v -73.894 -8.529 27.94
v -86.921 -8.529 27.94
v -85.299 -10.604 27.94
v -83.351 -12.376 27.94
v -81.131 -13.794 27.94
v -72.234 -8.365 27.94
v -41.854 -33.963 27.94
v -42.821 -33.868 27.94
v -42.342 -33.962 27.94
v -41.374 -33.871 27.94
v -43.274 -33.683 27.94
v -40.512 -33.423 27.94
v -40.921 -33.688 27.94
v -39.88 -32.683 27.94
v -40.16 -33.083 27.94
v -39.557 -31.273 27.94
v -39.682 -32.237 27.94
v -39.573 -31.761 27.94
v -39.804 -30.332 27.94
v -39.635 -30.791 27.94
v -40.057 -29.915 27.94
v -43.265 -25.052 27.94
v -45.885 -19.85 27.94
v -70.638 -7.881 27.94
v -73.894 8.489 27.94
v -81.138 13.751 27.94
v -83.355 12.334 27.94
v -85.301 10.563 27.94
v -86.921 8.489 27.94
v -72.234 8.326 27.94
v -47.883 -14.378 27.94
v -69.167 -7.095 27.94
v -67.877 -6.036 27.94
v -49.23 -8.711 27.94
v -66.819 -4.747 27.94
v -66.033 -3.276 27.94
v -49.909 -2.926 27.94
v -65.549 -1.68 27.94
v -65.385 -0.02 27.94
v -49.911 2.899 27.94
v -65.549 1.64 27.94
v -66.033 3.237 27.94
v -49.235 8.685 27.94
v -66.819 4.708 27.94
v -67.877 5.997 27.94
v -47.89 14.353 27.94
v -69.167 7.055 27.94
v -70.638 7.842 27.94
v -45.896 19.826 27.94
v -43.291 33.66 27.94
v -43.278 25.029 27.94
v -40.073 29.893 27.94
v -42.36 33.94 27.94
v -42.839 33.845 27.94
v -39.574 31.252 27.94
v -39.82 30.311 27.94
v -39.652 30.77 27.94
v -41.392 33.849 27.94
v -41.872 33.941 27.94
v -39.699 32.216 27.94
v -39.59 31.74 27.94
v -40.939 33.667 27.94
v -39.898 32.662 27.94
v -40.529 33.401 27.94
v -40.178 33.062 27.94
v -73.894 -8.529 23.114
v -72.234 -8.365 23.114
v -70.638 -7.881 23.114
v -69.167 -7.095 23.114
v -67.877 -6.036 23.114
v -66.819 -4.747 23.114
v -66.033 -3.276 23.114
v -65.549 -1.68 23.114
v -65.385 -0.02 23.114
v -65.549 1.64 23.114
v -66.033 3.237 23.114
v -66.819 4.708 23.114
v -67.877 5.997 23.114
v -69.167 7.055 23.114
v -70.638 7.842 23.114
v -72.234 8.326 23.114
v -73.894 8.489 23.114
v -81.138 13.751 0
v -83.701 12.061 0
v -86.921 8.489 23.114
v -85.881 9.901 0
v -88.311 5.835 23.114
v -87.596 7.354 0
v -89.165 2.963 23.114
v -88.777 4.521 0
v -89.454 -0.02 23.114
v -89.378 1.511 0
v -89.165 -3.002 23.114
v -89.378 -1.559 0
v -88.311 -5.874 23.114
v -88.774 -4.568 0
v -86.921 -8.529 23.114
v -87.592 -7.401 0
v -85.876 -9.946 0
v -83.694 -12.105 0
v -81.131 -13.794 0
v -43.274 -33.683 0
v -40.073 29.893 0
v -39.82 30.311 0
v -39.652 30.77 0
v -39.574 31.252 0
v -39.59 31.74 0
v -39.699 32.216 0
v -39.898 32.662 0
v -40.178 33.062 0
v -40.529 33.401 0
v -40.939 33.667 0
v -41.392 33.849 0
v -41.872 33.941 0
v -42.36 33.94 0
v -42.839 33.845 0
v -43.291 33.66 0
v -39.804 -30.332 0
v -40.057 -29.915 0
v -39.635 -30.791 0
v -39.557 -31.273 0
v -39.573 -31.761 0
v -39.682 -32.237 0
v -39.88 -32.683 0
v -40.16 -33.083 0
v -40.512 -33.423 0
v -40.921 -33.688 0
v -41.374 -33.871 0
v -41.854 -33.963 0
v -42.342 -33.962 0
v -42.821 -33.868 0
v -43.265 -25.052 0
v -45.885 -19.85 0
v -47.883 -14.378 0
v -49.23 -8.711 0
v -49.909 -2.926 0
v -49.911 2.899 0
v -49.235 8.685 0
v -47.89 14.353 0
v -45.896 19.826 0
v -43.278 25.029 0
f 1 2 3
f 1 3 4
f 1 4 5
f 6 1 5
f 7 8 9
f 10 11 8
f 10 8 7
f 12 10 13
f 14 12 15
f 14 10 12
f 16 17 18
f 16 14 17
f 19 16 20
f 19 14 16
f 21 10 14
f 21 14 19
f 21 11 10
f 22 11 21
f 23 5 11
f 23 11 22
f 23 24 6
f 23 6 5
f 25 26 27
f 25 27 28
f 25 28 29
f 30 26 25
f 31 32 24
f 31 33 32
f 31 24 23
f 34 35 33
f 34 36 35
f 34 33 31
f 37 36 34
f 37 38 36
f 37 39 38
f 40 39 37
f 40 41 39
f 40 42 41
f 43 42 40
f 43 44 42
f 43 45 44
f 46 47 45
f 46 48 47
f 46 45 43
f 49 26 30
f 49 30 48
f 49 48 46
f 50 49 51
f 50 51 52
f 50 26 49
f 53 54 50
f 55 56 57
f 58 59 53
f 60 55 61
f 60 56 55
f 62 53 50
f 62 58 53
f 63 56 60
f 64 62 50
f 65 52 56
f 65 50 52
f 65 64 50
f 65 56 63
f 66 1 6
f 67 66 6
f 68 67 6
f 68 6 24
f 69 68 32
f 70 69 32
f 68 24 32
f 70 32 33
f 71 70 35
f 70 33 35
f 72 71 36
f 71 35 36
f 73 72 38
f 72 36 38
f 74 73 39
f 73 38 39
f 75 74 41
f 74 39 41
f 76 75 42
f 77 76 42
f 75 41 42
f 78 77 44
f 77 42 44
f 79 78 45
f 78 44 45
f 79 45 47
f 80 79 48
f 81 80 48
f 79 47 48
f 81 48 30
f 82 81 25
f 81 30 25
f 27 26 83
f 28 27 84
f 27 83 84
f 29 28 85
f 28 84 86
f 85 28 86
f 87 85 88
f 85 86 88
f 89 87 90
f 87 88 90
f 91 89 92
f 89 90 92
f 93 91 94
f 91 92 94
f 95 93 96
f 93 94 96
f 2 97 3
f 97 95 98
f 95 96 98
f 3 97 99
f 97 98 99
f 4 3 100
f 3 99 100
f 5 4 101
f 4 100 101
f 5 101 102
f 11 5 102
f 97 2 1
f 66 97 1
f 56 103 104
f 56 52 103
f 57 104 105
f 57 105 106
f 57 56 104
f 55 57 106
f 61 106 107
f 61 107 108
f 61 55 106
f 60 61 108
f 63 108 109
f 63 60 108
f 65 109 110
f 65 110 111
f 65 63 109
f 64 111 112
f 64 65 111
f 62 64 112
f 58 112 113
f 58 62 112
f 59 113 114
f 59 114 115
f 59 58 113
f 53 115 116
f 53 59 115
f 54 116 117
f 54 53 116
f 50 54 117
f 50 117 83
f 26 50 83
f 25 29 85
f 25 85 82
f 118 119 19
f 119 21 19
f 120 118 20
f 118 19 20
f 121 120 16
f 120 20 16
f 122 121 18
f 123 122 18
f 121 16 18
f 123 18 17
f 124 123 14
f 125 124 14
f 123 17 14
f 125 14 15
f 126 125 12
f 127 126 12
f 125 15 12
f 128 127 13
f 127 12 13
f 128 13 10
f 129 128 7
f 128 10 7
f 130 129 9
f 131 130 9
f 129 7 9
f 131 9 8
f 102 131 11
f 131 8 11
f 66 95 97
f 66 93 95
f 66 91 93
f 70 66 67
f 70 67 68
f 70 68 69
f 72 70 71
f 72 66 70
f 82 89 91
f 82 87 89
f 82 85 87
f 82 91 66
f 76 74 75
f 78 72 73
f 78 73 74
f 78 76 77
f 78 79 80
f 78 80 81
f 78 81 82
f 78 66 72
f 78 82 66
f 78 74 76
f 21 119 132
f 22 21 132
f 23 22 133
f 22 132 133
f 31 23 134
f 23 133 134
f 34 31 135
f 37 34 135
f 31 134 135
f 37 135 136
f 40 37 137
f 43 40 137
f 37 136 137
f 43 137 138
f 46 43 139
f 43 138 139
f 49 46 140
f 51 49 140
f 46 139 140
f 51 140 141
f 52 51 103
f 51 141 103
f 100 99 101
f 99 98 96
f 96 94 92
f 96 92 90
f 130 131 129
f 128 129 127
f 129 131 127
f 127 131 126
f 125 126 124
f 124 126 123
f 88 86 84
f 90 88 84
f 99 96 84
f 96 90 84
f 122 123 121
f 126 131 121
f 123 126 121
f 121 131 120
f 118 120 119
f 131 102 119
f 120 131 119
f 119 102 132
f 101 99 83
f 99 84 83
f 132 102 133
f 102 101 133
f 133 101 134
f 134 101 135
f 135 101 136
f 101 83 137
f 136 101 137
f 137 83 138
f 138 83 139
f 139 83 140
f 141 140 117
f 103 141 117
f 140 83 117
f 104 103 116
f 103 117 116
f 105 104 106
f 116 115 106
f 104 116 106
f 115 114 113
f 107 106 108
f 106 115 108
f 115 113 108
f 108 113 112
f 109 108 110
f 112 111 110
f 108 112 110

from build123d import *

# Parameters (mm, degrees)
F1_DEPTH = 27.94
F2_W     = 27.048528
F2_H     = 17.018
F3_DEPTH = 4.826
F4_R     = 2.54


with BuildPart() as f1:
    # F0 (on Top) → F1 (new body)
    with BuildSketch(Plane.XY):
        with BuildLine():
            ThreePointArc((-25.211154, -43.172467), (-49.99464, -0.013258), (-25.234047, 43.15909))
            Line((-25.234047, 43.15909), (-81.138089, 13.751116))
            ThreePointArc((-81.138089, 13.751116), (-89.453911, -0.023722), (-81.130784, -13.794148))
            Line((-81.130784, -13.794148), (-25.211154, -43.172467))
        make_face()
    extrude(amount=F1_DEPTH)

    # F2 (on face) → F3 (cut)
    with BuildSketch(Plane.XY.offset(27.94)):
        with BuildLine():
            Line((-73.894091, 8.489404), (-73.894091, -8.528596))
            ThreePointArc((-73.894091, -8.528596), (-65.385091, -0.019596), (-73.894091, 8.489404))
        make_face()
        with Locations((-87.418355, -0.019596)):
            Rectangle(F2_W, F2_H)
    extrude(amount=-F3_DEPTH, mode=Mode.SUBTRACT)

    # F4
    f4_edges = [f1.edges().sort_by_distance(p)[0] for p in [
        (-25.211154, -43.172467, 13.97),
        (-25.234047, 43.15909, 13.97),
    ]]
    fillet(f4_edges, radius=F4_R)


solid = f1.part
